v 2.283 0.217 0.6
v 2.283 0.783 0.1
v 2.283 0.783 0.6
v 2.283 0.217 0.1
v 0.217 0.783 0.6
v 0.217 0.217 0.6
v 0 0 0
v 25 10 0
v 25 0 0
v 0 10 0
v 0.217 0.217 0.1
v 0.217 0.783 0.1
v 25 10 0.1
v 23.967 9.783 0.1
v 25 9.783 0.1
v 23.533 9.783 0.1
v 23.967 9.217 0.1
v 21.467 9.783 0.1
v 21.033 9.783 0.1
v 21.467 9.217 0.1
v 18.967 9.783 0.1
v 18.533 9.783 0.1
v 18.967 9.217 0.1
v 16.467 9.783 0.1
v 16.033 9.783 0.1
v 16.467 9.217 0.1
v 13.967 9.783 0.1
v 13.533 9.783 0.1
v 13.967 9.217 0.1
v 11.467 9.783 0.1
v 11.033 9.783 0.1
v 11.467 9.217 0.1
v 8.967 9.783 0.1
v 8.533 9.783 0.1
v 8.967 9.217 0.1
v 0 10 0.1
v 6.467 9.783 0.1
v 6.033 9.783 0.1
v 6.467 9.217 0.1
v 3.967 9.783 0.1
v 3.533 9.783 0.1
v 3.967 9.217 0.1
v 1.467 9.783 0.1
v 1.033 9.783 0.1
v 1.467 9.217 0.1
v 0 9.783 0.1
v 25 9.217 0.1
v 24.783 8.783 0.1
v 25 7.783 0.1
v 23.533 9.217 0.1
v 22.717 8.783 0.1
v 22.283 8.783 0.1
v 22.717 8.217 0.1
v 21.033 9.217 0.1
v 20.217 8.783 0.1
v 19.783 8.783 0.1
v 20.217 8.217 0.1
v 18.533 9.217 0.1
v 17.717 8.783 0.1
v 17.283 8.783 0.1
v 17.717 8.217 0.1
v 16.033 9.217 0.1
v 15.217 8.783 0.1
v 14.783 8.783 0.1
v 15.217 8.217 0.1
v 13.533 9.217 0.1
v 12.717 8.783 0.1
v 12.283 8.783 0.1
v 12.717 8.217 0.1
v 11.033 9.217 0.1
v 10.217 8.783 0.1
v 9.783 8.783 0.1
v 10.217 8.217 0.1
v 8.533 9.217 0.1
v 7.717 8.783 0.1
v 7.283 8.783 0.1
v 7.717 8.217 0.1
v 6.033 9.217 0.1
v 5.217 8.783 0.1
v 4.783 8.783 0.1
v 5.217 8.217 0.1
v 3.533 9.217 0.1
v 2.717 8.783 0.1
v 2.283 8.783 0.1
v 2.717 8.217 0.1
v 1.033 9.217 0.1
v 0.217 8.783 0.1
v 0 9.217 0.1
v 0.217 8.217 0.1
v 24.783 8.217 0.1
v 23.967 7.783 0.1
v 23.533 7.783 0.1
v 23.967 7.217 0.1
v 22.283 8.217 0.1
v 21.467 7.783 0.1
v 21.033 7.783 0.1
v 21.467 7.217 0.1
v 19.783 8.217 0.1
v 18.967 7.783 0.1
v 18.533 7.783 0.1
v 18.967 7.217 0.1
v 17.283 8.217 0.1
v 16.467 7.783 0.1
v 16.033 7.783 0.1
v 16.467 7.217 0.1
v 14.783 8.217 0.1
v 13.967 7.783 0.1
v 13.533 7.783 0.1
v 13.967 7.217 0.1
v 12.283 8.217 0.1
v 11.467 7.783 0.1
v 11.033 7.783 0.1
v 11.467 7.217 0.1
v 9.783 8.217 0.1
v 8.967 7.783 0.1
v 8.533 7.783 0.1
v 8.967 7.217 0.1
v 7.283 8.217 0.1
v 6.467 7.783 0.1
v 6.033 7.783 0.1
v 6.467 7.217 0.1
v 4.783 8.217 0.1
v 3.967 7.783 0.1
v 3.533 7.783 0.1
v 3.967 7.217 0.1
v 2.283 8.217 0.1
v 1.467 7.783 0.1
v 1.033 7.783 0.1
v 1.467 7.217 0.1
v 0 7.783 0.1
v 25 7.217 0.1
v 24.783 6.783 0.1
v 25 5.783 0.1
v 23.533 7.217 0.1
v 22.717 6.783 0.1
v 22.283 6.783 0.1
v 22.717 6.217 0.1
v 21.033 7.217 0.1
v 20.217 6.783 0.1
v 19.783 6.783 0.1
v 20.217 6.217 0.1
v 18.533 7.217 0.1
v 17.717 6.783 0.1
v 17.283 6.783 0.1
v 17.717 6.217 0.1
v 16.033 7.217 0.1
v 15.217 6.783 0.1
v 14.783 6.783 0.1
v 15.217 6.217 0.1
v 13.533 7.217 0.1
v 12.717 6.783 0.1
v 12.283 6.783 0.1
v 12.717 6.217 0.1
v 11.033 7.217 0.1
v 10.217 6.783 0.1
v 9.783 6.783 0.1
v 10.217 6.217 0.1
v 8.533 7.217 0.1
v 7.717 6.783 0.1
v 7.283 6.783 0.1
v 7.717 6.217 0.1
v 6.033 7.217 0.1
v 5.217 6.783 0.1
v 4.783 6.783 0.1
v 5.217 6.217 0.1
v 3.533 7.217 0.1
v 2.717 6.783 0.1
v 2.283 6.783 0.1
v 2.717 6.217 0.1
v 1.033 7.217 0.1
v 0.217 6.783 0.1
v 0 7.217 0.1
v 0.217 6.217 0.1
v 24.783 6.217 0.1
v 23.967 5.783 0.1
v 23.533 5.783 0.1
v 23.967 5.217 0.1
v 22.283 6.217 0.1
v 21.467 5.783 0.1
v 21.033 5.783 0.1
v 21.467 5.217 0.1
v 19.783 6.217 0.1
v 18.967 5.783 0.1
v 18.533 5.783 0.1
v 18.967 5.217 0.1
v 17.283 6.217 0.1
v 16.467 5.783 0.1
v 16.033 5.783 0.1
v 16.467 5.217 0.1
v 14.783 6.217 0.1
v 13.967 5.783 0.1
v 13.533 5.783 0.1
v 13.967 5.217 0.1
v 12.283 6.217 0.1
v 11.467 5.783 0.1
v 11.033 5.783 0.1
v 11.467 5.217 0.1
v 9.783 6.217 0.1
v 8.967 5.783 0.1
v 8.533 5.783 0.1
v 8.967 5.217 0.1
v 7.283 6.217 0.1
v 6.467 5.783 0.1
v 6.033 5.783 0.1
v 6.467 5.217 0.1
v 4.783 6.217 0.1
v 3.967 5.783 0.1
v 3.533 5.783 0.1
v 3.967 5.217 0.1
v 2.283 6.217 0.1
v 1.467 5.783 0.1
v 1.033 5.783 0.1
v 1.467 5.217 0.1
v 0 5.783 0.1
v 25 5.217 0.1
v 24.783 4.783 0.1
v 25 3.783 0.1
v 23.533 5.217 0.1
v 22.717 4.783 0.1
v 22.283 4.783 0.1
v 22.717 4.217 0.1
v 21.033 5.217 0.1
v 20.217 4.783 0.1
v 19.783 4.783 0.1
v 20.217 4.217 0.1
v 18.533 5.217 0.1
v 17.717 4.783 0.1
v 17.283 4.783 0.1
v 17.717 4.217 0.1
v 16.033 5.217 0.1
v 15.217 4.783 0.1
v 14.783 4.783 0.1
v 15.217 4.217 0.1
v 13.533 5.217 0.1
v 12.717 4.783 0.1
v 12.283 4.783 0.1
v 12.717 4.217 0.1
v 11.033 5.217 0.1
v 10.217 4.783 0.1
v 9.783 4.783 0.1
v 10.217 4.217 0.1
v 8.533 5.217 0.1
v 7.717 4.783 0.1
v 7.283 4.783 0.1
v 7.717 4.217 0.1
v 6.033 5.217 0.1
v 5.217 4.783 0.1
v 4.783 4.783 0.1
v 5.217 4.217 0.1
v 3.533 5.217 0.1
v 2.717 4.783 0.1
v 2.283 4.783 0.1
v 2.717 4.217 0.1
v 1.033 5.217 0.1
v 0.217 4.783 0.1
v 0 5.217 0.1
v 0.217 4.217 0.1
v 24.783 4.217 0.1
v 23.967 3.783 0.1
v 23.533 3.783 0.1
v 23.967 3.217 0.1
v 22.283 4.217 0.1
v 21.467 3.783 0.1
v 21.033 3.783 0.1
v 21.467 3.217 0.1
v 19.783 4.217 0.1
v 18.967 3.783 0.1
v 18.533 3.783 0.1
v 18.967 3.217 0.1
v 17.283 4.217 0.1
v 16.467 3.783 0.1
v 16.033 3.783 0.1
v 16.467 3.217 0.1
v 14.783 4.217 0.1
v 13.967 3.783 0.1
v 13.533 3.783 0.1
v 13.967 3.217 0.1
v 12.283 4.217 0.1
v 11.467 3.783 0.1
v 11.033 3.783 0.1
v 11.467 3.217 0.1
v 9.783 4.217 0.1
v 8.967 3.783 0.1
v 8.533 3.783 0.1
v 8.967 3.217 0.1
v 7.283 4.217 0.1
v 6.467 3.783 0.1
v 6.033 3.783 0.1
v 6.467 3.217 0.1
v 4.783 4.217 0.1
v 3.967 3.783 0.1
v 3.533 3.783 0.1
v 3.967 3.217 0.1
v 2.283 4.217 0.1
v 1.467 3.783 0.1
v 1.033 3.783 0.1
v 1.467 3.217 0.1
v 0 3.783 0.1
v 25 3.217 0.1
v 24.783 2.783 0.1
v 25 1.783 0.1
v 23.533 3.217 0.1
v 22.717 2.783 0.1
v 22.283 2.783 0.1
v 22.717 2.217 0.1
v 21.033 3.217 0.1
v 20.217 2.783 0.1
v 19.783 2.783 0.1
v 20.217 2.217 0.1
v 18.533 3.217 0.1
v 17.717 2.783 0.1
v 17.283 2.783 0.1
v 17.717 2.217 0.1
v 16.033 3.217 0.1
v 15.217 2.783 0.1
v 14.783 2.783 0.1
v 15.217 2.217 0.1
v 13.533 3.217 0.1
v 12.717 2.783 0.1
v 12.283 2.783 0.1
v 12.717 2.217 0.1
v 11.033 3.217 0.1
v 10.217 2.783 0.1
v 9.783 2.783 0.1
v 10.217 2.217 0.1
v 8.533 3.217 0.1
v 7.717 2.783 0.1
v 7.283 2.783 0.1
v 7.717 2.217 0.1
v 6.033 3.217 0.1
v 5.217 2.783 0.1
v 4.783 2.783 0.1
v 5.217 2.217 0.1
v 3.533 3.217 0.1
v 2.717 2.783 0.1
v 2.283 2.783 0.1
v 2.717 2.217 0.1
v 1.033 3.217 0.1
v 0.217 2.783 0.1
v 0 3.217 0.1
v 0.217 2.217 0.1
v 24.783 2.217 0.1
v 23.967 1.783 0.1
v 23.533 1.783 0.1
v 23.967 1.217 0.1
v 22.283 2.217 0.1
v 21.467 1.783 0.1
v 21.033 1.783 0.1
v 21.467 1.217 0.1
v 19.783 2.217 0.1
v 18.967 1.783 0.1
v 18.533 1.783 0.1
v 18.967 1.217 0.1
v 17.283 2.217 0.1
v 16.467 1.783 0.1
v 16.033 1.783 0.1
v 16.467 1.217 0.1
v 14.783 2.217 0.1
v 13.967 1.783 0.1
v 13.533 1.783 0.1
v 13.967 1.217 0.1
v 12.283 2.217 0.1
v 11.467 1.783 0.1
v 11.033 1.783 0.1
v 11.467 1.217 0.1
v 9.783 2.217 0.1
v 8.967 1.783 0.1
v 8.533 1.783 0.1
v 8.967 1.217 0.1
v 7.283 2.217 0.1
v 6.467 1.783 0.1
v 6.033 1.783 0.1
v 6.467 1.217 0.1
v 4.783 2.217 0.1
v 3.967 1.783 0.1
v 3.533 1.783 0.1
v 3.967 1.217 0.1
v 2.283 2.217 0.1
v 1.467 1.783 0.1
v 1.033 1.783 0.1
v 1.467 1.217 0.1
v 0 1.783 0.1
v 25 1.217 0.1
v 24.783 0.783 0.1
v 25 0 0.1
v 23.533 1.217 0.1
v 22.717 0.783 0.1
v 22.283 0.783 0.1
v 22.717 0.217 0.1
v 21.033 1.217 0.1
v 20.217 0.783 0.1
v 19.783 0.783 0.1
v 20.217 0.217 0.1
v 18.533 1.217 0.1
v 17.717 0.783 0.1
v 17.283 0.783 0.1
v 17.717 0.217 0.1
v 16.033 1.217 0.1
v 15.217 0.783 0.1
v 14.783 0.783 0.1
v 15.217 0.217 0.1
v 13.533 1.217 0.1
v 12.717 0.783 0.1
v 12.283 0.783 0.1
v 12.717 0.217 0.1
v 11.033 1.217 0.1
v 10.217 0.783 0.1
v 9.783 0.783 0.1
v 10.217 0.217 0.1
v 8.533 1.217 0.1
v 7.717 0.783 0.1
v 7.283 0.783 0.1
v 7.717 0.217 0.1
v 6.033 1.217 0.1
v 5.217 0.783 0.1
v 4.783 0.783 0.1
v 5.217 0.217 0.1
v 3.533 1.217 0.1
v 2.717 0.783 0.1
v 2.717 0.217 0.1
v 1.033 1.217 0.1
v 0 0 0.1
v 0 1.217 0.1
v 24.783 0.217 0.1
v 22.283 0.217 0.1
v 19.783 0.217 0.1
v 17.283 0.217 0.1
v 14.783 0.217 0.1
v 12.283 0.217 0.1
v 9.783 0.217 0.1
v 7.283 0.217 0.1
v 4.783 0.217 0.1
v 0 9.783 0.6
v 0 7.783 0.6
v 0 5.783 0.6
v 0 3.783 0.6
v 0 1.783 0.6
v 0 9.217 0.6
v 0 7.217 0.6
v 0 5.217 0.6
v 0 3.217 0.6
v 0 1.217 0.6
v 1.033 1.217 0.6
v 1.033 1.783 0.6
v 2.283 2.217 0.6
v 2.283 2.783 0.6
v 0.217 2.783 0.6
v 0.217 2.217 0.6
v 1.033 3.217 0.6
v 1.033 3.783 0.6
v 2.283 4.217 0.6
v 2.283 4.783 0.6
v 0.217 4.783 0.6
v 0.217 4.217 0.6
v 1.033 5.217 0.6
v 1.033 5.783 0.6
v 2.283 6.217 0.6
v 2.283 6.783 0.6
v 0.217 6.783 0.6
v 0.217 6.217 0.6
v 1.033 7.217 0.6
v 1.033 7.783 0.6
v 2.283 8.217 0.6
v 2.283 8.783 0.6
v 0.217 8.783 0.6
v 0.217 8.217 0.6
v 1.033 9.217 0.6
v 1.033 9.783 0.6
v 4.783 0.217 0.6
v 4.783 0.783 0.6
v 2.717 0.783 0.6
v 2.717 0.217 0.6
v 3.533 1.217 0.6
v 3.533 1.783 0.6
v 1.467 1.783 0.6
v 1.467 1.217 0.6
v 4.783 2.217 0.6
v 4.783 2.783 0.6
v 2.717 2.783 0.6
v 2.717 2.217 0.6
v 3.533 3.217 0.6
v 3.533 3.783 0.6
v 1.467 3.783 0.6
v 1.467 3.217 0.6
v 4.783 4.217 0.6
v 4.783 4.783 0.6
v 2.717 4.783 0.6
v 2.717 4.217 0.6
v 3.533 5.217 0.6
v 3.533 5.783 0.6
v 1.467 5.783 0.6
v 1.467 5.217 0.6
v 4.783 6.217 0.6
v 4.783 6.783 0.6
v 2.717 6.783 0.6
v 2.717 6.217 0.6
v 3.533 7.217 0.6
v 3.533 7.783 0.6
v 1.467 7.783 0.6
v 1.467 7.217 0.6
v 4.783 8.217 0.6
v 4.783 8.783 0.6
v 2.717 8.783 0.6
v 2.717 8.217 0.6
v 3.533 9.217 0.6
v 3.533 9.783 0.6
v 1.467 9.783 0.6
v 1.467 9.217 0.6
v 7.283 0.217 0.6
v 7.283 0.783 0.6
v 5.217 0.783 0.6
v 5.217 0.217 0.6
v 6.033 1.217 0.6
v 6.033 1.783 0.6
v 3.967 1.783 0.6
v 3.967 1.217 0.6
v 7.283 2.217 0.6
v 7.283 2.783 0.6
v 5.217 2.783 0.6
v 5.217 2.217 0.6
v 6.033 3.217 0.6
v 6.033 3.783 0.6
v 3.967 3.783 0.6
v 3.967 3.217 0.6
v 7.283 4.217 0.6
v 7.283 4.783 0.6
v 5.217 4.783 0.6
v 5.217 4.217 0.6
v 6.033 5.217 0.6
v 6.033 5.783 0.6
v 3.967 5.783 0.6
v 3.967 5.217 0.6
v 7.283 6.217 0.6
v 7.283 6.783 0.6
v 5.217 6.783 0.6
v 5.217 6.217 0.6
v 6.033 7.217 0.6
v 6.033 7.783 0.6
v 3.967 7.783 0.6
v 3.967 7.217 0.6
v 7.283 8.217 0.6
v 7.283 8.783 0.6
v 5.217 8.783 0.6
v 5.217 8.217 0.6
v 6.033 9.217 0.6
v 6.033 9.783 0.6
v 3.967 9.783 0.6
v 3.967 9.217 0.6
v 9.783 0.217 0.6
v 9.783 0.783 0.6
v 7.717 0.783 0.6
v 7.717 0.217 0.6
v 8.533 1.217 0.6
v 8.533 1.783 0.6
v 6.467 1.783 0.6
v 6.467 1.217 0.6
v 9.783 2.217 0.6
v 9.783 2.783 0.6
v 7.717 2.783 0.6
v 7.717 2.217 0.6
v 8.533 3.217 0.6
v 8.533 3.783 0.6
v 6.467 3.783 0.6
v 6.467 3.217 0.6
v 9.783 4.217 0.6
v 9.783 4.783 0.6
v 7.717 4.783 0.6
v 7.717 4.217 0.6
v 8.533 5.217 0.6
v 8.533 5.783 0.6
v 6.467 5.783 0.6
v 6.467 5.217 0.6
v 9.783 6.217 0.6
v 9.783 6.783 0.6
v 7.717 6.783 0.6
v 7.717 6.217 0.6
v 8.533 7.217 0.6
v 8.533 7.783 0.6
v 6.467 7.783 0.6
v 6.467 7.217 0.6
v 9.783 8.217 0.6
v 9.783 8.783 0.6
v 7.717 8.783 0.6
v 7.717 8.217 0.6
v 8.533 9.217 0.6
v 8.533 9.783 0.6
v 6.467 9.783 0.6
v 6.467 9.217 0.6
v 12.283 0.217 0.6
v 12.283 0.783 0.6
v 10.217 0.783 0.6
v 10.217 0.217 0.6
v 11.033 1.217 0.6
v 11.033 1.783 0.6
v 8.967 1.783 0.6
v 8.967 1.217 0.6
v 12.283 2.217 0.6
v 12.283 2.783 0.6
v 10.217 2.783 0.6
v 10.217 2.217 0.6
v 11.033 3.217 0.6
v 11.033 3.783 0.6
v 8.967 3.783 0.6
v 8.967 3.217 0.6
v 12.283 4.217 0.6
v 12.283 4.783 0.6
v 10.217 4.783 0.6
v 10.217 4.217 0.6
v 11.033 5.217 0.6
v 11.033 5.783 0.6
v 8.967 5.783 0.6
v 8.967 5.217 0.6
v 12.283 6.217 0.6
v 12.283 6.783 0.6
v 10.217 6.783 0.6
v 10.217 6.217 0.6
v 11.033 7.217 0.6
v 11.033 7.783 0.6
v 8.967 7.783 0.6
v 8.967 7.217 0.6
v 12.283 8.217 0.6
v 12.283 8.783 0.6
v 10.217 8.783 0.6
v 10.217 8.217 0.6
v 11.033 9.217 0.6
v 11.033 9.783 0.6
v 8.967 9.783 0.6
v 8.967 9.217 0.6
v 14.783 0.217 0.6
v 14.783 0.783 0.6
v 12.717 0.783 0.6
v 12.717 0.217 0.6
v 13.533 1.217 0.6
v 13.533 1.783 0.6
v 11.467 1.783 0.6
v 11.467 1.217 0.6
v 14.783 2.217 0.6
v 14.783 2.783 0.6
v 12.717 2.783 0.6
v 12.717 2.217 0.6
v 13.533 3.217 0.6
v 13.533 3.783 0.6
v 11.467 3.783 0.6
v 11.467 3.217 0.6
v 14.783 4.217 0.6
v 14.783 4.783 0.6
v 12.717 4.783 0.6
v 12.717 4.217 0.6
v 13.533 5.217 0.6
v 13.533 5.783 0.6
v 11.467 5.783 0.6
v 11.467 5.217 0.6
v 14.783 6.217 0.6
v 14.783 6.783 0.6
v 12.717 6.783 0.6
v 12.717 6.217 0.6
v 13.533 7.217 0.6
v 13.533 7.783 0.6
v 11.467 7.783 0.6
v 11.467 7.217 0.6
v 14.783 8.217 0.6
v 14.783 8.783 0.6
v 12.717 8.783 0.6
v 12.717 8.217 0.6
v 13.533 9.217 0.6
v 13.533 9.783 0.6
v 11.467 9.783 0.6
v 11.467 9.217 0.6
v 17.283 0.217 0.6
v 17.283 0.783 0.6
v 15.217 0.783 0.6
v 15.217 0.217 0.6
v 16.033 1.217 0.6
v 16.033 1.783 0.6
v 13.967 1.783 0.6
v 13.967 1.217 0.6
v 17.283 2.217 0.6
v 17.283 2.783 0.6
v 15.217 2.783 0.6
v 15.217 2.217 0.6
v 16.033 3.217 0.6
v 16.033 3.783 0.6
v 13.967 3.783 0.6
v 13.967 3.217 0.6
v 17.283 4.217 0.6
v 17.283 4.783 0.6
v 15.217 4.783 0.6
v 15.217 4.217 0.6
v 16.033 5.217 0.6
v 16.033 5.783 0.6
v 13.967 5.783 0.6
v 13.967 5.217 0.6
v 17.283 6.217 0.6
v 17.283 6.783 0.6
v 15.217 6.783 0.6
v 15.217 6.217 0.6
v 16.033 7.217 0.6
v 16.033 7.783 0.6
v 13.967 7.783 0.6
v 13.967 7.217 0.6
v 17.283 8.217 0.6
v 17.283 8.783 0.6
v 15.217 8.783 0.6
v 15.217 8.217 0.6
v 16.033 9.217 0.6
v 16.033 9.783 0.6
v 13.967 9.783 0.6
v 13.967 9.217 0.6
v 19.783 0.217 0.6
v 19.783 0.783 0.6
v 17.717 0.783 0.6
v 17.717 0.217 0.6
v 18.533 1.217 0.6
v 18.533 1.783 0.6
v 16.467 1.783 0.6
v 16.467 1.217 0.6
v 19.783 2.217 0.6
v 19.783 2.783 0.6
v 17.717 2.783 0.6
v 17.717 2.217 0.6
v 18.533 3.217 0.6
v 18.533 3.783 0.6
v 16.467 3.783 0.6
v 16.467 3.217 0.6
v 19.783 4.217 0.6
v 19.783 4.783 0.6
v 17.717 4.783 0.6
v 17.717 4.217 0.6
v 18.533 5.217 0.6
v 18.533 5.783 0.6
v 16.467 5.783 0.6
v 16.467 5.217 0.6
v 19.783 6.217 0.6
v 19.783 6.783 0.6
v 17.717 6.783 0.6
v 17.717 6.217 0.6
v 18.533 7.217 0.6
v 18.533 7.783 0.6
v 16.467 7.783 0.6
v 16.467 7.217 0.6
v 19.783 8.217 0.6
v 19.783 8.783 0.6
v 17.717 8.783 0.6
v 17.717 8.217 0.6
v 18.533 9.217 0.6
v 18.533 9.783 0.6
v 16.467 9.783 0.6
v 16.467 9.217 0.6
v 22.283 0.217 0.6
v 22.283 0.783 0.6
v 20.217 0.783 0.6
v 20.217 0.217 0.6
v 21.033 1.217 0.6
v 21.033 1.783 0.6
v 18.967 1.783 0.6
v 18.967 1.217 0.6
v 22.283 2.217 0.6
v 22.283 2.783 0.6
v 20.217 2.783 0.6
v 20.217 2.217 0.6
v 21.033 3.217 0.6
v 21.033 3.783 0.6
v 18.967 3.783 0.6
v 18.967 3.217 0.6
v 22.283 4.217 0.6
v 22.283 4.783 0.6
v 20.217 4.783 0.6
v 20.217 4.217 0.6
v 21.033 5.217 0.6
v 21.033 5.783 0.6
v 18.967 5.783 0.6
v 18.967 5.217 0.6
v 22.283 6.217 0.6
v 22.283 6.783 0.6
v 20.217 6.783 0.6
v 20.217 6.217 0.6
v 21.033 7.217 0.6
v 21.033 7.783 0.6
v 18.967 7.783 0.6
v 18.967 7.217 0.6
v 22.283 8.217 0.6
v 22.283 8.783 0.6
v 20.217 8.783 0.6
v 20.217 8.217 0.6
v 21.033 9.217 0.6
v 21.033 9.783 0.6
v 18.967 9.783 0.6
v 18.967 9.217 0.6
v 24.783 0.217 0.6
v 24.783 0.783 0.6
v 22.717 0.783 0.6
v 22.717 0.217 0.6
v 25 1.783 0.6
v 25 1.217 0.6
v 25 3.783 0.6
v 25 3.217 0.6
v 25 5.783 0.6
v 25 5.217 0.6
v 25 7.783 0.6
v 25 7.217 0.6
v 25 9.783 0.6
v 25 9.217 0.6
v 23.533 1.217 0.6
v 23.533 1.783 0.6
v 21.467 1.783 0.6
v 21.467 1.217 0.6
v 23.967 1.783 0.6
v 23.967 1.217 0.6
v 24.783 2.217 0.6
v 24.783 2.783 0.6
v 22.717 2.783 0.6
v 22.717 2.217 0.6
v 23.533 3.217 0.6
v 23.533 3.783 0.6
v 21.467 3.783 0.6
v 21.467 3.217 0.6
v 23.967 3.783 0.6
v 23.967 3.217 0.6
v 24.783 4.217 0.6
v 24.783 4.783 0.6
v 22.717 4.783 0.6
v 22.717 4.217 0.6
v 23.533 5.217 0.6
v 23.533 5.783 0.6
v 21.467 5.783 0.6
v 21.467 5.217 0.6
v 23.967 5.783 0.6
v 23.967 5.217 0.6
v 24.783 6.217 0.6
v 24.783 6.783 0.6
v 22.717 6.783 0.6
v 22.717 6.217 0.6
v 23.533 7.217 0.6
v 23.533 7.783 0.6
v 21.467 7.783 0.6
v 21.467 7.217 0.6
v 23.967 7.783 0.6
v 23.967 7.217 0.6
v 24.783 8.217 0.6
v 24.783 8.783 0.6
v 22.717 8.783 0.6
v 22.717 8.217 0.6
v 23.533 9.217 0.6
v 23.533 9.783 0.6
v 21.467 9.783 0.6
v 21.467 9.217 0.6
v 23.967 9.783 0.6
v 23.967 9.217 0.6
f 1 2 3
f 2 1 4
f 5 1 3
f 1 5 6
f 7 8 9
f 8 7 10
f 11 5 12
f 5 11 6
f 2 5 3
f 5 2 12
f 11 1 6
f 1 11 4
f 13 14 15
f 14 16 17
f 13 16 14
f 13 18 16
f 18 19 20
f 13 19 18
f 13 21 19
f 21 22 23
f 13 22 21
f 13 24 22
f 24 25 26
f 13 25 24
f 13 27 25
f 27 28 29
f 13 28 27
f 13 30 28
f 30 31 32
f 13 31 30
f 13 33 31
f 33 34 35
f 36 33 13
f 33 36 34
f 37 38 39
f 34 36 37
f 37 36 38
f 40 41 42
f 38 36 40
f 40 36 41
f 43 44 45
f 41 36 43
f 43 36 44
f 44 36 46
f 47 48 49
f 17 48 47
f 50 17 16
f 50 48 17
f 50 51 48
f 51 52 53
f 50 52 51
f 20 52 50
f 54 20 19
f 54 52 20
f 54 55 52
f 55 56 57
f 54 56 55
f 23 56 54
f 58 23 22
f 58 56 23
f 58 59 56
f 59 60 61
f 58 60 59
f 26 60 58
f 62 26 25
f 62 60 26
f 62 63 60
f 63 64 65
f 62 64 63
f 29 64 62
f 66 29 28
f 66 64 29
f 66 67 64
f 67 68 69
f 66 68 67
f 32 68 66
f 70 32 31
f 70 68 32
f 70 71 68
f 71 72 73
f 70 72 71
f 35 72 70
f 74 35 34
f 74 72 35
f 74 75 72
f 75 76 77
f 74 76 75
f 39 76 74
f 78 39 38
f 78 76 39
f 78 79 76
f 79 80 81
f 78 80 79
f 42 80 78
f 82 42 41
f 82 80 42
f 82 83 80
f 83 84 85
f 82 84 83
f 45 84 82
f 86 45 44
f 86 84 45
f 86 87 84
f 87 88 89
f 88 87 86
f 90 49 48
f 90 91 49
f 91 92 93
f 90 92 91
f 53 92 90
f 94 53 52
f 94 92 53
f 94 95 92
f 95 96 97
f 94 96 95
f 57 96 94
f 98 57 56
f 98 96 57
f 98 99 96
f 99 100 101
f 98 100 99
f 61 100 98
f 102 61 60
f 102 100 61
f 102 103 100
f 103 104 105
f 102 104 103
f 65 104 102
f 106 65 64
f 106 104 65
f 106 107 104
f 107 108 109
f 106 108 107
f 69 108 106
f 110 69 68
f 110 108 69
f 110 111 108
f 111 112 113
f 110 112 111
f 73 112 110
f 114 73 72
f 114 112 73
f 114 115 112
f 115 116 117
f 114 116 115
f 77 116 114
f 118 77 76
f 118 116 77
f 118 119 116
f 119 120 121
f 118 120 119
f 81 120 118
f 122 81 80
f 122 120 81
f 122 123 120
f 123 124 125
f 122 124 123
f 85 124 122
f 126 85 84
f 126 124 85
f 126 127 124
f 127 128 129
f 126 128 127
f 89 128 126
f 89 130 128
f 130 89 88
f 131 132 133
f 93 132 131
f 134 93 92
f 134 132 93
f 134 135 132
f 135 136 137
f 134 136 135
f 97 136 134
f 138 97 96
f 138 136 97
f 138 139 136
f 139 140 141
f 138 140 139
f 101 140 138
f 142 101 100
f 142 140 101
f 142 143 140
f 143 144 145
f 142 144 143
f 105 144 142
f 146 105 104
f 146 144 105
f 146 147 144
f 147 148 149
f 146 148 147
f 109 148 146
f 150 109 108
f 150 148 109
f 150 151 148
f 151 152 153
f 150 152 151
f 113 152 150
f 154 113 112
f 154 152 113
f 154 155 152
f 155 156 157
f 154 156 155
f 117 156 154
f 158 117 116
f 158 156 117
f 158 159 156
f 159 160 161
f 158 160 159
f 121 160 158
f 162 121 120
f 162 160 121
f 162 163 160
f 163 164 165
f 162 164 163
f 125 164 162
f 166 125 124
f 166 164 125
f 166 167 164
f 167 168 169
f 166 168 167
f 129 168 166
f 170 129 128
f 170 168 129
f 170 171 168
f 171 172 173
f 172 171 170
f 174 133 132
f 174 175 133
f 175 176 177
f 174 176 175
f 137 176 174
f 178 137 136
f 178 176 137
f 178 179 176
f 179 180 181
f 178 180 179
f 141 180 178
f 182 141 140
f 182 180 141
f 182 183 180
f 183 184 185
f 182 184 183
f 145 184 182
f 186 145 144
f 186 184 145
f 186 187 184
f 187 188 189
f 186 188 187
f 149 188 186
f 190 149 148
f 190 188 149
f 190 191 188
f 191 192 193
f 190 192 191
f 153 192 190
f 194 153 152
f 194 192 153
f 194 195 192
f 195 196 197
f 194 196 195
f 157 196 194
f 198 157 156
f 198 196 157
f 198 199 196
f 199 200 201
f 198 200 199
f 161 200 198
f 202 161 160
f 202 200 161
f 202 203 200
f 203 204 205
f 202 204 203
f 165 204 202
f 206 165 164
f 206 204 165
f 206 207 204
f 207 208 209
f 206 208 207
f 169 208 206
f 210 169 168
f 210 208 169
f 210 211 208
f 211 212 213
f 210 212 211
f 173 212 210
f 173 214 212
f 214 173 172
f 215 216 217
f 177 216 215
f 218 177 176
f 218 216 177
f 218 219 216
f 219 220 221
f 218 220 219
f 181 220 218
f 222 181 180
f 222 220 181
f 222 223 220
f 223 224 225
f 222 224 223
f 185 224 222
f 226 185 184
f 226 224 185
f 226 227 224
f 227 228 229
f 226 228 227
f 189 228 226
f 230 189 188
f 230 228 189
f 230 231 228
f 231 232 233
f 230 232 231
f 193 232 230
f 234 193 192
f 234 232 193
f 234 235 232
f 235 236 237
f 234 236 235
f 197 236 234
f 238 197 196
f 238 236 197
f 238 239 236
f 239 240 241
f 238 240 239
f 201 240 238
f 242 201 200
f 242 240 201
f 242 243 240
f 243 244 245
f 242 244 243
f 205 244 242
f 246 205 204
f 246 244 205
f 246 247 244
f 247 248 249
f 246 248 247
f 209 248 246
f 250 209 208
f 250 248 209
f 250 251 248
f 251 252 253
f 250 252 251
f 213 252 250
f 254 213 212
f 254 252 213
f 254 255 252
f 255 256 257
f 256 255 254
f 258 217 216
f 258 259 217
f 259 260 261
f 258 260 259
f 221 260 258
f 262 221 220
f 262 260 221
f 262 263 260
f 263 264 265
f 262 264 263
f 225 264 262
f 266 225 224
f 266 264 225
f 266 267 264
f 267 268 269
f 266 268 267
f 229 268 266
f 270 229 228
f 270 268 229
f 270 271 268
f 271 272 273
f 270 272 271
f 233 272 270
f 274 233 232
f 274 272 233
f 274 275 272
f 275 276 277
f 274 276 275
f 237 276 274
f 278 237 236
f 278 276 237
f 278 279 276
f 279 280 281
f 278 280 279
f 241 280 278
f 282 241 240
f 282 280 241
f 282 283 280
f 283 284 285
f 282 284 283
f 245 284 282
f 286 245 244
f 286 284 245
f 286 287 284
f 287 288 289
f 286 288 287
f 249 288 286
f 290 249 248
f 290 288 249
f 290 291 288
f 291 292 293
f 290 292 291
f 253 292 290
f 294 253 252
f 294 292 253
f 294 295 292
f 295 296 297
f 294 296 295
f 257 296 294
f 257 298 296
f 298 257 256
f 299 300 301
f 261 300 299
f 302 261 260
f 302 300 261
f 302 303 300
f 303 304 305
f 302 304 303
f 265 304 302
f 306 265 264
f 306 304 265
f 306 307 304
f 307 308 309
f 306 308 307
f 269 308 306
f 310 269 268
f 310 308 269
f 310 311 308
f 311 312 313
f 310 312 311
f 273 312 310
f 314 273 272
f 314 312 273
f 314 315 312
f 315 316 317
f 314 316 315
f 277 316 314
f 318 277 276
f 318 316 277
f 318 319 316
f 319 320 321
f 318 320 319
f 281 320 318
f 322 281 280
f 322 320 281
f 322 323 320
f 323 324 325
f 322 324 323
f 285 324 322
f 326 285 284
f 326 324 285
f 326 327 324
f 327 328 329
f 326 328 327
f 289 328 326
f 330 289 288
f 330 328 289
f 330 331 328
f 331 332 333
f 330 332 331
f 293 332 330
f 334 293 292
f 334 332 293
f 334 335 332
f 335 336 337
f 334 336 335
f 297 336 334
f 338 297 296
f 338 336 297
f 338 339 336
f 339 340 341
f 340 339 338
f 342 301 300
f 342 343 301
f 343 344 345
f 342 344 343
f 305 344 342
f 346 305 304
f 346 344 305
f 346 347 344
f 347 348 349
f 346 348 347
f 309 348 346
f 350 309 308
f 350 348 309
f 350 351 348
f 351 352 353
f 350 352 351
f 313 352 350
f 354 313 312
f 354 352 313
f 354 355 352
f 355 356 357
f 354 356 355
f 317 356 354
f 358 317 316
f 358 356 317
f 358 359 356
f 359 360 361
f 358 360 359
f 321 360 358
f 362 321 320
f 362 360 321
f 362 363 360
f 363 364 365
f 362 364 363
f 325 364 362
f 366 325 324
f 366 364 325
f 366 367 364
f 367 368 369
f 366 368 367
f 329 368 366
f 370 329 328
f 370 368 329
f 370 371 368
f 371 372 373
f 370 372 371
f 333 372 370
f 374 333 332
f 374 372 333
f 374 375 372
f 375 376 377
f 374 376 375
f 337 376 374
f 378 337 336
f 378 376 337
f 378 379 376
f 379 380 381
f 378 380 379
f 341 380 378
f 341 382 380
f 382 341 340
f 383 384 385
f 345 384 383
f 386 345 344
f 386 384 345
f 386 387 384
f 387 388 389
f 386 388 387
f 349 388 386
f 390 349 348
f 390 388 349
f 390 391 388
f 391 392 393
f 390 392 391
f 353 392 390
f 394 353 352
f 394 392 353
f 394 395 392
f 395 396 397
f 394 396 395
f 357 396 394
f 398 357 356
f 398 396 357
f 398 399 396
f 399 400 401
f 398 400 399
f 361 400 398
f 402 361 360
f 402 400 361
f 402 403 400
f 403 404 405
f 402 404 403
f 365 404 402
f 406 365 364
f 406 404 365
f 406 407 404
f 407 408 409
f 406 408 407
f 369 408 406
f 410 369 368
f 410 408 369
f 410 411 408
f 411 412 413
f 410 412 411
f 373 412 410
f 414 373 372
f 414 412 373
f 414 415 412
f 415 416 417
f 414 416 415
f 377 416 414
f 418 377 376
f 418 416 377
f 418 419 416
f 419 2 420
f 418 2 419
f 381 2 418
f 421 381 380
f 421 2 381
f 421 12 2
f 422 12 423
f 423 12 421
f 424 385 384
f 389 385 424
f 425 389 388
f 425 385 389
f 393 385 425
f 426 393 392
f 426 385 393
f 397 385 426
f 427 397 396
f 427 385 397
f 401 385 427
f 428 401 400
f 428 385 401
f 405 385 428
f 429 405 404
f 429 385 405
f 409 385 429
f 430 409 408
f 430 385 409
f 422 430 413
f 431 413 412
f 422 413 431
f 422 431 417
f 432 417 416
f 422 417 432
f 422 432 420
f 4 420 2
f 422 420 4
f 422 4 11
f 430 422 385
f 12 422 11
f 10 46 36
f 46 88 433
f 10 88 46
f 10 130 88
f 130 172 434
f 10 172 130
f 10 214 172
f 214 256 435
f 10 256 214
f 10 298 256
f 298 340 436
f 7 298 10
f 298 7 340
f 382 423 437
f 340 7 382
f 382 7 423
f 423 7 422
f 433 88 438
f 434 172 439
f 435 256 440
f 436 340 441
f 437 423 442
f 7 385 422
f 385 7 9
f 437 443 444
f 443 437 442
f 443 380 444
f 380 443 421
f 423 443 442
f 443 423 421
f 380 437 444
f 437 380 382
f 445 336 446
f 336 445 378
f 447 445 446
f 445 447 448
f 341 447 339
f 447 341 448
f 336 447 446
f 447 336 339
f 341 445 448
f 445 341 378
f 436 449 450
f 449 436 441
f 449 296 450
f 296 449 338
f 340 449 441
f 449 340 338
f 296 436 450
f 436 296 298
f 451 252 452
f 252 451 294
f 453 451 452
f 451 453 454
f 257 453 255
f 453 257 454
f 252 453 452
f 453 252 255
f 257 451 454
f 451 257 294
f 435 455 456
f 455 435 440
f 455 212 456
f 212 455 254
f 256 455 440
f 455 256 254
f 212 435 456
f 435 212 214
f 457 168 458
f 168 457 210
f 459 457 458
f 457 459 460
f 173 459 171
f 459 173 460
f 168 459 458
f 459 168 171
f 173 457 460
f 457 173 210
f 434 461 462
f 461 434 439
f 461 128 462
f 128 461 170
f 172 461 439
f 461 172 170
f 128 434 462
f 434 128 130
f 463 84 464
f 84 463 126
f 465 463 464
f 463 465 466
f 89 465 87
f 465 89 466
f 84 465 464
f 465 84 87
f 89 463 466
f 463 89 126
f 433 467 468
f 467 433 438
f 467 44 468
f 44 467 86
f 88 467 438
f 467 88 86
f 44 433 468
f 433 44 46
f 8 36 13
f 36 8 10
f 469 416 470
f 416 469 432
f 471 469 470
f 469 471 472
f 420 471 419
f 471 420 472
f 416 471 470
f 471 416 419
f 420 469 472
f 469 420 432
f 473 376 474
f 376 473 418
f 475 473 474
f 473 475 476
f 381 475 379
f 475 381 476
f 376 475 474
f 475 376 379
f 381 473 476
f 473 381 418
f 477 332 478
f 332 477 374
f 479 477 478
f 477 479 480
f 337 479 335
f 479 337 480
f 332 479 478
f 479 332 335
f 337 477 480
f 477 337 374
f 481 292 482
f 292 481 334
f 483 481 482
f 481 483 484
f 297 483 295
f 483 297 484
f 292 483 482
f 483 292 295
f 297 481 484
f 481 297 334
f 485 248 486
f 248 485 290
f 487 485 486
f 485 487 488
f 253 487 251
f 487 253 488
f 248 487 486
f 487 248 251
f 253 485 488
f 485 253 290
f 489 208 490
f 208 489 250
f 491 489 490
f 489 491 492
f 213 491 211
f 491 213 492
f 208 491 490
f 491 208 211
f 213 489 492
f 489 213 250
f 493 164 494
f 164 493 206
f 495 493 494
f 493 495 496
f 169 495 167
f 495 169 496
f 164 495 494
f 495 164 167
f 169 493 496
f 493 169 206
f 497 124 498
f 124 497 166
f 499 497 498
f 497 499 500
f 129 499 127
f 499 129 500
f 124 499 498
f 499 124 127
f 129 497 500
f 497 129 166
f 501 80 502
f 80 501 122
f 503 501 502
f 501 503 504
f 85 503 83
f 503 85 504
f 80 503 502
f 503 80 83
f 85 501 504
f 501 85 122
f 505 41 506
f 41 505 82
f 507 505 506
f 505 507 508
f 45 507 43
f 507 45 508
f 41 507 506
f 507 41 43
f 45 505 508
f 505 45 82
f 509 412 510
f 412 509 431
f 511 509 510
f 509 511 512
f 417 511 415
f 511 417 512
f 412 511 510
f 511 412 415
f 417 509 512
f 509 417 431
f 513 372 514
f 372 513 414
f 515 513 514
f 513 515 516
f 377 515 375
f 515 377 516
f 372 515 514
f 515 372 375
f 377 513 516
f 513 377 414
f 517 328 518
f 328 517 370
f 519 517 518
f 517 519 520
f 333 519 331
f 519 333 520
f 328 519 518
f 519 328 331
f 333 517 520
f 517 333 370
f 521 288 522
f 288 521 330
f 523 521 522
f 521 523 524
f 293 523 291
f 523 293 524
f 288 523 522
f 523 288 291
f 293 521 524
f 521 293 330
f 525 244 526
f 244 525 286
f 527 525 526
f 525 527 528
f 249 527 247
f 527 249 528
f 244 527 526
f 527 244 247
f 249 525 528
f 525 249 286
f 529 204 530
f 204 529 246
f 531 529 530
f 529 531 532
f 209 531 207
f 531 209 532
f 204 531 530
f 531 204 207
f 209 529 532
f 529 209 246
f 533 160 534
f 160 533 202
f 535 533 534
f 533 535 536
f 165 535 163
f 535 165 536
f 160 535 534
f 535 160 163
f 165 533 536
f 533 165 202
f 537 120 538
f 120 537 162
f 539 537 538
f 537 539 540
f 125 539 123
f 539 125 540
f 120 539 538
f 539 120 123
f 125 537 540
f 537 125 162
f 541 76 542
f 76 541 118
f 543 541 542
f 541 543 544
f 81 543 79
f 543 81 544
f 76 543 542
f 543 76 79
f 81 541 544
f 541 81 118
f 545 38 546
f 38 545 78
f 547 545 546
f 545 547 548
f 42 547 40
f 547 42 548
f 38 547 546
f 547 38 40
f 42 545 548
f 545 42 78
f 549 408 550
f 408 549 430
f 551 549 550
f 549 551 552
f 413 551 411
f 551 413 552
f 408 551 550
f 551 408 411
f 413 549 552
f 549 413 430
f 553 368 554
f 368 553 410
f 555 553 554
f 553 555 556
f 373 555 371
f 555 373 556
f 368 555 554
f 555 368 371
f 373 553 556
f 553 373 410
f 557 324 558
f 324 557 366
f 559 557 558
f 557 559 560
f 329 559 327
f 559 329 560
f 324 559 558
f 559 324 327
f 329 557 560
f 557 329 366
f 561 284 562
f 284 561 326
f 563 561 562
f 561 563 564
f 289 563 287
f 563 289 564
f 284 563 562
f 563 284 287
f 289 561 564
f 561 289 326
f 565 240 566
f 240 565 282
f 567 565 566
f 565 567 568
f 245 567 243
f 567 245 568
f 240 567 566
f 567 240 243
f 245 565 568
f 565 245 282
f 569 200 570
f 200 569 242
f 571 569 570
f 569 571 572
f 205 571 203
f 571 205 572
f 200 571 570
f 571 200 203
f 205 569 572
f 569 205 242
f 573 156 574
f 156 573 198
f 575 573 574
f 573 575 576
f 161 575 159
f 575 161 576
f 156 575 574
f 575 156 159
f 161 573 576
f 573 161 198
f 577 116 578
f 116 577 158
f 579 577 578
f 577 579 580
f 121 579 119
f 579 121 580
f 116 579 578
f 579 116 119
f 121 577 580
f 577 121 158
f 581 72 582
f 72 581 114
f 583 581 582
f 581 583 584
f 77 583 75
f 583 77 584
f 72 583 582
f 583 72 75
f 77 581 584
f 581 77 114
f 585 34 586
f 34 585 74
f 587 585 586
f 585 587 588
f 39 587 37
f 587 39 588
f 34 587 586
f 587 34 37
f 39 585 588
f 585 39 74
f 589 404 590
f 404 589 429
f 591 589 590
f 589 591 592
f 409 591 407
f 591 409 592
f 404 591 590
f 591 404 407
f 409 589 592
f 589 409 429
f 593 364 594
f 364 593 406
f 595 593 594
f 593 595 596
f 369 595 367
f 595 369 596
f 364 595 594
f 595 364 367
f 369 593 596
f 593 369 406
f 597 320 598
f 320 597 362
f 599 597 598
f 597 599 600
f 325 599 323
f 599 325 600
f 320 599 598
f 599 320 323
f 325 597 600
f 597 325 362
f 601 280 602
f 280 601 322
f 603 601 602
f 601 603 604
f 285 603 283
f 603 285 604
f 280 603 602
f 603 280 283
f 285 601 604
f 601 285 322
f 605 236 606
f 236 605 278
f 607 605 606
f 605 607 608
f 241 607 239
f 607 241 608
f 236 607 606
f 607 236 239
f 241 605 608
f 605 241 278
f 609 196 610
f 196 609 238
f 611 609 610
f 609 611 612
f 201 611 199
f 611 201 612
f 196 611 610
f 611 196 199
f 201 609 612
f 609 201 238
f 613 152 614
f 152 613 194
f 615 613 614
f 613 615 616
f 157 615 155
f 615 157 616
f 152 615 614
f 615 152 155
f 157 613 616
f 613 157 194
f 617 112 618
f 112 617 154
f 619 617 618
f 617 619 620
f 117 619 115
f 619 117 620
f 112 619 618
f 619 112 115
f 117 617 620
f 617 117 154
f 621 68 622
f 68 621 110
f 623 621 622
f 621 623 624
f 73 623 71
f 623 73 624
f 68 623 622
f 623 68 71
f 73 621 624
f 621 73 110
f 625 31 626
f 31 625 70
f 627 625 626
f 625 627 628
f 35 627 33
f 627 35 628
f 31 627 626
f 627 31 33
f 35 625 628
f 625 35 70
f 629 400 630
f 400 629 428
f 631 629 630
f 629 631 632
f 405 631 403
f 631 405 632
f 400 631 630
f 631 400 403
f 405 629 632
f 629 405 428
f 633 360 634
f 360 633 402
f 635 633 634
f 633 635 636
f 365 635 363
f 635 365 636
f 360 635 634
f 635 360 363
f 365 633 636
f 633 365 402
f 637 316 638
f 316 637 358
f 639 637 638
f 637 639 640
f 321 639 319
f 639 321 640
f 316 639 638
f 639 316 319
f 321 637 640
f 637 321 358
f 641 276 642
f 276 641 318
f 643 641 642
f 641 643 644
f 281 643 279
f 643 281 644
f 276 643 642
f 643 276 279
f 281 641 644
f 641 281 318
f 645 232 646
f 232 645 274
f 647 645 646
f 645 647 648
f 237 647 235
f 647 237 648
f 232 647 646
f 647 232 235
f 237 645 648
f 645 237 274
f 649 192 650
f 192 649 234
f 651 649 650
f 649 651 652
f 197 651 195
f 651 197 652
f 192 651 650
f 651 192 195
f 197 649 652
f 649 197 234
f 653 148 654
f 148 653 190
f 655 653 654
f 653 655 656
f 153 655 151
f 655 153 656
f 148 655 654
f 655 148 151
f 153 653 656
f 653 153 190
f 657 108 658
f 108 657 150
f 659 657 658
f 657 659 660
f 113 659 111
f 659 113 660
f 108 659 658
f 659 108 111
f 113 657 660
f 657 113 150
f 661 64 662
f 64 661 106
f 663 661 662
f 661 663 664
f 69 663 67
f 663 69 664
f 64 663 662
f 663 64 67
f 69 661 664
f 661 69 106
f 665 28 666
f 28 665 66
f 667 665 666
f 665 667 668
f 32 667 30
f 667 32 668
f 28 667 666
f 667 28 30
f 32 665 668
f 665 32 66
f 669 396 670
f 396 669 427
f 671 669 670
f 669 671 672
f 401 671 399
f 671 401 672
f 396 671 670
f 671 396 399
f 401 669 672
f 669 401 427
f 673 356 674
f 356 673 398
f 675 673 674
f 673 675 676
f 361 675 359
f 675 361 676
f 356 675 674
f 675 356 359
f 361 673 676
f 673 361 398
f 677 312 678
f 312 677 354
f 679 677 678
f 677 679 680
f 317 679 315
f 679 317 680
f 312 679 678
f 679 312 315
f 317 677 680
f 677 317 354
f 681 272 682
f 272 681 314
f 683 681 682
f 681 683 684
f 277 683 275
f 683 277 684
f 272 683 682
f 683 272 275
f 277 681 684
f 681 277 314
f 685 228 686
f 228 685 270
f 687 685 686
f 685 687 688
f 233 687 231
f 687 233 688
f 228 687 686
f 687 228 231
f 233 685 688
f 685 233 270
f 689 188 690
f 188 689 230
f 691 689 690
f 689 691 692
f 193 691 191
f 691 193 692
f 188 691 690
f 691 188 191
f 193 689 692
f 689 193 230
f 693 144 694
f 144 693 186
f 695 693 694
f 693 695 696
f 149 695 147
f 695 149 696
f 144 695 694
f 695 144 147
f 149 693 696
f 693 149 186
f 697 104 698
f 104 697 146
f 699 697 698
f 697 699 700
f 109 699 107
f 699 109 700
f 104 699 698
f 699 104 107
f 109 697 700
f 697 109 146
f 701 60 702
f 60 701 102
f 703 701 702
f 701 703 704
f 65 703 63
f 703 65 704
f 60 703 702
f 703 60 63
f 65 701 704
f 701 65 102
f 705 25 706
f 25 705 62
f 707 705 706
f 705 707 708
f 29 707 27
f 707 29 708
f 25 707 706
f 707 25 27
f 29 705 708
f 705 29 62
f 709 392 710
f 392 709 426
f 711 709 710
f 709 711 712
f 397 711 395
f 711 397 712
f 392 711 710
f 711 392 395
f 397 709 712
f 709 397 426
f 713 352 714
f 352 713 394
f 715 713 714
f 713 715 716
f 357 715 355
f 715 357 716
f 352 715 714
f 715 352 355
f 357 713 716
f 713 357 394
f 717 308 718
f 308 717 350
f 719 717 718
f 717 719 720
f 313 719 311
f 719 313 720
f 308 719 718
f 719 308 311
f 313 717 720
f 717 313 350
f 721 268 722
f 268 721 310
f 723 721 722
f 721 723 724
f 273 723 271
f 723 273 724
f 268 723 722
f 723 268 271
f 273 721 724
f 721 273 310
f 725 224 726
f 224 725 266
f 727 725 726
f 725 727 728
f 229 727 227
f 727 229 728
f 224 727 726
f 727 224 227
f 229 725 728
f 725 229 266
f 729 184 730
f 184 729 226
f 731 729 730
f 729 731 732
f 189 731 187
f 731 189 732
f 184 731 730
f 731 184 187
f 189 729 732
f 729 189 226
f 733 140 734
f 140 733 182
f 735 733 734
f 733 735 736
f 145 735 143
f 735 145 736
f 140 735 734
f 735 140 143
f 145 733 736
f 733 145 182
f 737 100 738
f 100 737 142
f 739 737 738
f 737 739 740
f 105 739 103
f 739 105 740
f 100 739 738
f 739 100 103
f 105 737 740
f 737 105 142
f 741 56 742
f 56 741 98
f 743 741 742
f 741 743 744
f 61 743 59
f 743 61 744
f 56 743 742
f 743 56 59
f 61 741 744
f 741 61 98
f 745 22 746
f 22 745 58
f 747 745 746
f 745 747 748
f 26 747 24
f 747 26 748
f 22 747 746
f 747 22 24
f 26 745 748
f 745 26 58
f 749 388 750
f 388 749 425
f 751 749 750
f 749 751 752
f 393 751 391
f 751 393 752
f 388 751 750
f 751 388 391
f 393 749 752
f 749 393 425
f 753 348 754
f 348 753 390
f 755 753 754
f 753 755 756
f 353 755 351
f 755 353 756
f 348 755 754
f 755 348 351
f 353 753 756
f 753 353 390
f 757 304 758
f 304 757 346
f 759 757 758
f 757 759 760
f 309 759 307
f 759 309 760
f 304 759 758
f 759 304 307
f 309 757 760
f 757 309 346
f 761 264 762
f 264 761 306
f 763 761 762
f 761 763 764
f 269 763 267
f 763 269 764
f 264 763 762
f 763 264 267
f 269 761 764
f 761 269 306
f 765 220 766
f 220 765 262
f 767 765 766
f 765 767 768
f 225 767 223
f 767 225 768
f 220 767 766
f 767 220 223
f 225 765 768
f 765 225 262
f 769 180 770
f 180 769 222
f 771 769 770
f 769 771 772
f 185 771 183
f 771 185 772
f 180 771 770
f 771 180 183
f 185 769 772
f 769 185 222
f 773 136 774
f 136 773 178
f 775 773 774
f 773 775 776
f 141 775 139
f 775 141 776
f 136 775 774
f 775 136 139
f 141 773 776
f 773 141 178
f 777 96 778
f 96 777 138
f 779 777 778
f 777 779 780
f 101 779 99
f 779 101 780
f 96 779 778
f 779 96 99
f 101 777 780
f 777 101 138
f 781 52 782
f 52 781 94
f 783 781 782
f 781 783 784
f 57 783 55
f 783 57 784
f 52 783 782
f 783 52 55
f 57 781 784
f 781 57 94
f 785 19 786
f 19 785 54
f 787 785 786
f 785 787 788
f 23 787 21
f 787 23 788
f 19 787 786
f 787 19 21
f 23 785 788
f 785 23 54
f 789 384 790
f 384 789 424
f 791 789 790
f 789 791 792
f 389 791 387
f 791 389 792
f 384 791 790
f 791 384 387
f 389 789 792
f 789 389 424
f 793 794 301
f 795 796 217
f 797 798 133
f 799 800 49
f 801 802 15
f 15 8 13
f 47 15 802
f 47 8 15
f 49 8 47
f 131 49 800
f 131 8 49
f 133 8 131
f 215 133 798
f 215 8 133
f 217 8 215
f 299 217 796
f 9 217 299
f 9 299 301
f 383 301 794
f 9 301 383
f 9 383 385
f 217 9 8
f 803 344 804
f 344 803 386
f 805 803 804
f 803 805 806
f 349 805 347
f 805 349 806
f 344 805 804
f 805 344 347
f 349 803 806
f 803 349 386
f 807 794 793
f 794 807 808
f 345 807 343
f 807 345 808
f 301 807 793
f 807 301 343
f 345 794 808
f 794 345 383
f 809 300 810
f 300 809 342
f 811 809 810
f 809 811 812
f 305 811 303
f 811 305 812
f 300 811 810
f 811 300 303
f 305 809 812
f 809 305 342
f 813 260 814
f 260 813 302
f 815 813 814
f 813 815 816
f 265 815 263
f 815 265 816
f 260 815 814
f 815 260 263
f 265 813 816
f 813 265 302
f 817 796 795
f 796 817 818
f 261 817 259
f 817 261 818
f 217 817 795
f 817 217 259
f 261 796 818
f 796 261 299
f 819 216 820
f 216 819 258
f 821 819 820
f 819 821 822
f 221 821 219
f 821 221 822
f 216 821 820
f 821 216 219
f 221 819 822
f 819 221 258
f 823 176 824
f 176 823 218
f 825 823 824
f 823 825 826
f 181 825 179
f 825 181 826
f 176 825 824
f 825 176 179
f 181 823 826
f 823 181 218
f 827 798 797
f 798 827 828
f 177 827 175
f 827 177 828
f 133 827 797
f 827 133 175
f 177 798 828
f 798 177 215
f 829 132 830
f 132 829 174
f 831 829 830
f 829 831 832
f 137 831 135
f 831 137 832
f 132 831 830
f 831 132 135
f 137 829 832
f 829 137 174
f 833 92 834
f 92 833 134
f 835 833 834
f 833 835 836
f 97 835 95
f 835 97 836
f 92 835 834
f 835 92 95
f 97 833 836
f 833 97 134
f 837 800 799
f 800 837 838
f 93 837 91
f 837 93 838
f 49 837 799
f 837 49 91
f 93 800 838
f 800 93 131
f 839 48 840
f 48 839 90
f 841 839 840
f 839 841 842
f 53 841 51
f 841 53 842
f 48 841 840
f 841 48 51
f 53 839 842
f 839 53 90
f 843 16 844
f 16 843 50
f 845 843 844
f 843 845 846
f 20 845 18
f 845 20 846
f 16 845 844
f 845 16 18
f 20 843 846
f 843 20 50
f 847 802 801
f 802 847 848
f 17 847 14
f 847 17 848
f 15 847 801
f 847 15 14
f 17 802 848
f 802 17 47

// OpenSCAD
block_thickness = 0.6; // unit_width が 2.5 になるよう逆算
clay_width = 13 / 30;  // unit_width が 2.5 になるよう逆算
clay_thickness = block_thickness - 0.5;

block_width = 2 * block_thickness + 2 * clay_width;

unit_width = block_width + clay_width;
unit_height = 1;

block_height = unit_height - clay_width;

module block() {
    color("brown")
    cube([block_width, block_height, block_thickness]);
}

module clay(right_end_clay = true) {
    color("grey")
    cube([unit_width - (right_end_clay ? 0 : block_thickness - clay_thickness), unit_height, clay_thickness]);
}

module unit(right_end_clay = true) {
    translate([clay_width / 2, clay_width / 2, 0])
    block();

    clay(right_end_clay);
}

module block_half() {
    color("brown")
    cube([block_width / 2, block_height, block_thickness]);
}

module clay_half(right_end_clay = true) {
    color("grey")
    cube([unit_width / 2 - (right_end_clay ? 0 : block_thickness - clay_thickness), unit_height, clay_thickness]);
}

module unit_half(right_end_clay = true) {
    translate([clay_width / 2, clay_width / 2, 0])
    block_half();

    clay_half(right_end_clay);
}

module wall(width, height, right_end_clay = true) {
    for (w = [0 : width - 1], h = [0 : height - 1]) {
        if (0 == h % 2) {
            translate([w * unit_width, h * unit_height, 0]) {
                if (w == width - 1) {
                    unit(right_end_clay);
                } else {
                    unit();
                }
            }
        } else {
            translate([0, h * unit_height, 0]) {
                if (w == 0) {
                    translate([unit_width / 2, unit_height, 0])
                    rotate([0, 0, 180])
                    unit_half();
                } else {
                    translate([(w - 0.5) * unit_width, 0, 0])
                    unit();
                }
                if (w == width - 1) {
                    translate([(w + 0.5) * unit_width, 0, 0])
                    unit_half(right_end_clay);
                }
            }
        }
    }
}

function unit_width() = unit_width;

function front_width() = 140;

function front_height() = 35;

function platform_height() = 16;

function back_height() = front_height() + platform_height();

function side_width() = 45;

function clay_thickness() = clay_thickness;

function block_thickness() = block_thickness;

wall(10, 10);
